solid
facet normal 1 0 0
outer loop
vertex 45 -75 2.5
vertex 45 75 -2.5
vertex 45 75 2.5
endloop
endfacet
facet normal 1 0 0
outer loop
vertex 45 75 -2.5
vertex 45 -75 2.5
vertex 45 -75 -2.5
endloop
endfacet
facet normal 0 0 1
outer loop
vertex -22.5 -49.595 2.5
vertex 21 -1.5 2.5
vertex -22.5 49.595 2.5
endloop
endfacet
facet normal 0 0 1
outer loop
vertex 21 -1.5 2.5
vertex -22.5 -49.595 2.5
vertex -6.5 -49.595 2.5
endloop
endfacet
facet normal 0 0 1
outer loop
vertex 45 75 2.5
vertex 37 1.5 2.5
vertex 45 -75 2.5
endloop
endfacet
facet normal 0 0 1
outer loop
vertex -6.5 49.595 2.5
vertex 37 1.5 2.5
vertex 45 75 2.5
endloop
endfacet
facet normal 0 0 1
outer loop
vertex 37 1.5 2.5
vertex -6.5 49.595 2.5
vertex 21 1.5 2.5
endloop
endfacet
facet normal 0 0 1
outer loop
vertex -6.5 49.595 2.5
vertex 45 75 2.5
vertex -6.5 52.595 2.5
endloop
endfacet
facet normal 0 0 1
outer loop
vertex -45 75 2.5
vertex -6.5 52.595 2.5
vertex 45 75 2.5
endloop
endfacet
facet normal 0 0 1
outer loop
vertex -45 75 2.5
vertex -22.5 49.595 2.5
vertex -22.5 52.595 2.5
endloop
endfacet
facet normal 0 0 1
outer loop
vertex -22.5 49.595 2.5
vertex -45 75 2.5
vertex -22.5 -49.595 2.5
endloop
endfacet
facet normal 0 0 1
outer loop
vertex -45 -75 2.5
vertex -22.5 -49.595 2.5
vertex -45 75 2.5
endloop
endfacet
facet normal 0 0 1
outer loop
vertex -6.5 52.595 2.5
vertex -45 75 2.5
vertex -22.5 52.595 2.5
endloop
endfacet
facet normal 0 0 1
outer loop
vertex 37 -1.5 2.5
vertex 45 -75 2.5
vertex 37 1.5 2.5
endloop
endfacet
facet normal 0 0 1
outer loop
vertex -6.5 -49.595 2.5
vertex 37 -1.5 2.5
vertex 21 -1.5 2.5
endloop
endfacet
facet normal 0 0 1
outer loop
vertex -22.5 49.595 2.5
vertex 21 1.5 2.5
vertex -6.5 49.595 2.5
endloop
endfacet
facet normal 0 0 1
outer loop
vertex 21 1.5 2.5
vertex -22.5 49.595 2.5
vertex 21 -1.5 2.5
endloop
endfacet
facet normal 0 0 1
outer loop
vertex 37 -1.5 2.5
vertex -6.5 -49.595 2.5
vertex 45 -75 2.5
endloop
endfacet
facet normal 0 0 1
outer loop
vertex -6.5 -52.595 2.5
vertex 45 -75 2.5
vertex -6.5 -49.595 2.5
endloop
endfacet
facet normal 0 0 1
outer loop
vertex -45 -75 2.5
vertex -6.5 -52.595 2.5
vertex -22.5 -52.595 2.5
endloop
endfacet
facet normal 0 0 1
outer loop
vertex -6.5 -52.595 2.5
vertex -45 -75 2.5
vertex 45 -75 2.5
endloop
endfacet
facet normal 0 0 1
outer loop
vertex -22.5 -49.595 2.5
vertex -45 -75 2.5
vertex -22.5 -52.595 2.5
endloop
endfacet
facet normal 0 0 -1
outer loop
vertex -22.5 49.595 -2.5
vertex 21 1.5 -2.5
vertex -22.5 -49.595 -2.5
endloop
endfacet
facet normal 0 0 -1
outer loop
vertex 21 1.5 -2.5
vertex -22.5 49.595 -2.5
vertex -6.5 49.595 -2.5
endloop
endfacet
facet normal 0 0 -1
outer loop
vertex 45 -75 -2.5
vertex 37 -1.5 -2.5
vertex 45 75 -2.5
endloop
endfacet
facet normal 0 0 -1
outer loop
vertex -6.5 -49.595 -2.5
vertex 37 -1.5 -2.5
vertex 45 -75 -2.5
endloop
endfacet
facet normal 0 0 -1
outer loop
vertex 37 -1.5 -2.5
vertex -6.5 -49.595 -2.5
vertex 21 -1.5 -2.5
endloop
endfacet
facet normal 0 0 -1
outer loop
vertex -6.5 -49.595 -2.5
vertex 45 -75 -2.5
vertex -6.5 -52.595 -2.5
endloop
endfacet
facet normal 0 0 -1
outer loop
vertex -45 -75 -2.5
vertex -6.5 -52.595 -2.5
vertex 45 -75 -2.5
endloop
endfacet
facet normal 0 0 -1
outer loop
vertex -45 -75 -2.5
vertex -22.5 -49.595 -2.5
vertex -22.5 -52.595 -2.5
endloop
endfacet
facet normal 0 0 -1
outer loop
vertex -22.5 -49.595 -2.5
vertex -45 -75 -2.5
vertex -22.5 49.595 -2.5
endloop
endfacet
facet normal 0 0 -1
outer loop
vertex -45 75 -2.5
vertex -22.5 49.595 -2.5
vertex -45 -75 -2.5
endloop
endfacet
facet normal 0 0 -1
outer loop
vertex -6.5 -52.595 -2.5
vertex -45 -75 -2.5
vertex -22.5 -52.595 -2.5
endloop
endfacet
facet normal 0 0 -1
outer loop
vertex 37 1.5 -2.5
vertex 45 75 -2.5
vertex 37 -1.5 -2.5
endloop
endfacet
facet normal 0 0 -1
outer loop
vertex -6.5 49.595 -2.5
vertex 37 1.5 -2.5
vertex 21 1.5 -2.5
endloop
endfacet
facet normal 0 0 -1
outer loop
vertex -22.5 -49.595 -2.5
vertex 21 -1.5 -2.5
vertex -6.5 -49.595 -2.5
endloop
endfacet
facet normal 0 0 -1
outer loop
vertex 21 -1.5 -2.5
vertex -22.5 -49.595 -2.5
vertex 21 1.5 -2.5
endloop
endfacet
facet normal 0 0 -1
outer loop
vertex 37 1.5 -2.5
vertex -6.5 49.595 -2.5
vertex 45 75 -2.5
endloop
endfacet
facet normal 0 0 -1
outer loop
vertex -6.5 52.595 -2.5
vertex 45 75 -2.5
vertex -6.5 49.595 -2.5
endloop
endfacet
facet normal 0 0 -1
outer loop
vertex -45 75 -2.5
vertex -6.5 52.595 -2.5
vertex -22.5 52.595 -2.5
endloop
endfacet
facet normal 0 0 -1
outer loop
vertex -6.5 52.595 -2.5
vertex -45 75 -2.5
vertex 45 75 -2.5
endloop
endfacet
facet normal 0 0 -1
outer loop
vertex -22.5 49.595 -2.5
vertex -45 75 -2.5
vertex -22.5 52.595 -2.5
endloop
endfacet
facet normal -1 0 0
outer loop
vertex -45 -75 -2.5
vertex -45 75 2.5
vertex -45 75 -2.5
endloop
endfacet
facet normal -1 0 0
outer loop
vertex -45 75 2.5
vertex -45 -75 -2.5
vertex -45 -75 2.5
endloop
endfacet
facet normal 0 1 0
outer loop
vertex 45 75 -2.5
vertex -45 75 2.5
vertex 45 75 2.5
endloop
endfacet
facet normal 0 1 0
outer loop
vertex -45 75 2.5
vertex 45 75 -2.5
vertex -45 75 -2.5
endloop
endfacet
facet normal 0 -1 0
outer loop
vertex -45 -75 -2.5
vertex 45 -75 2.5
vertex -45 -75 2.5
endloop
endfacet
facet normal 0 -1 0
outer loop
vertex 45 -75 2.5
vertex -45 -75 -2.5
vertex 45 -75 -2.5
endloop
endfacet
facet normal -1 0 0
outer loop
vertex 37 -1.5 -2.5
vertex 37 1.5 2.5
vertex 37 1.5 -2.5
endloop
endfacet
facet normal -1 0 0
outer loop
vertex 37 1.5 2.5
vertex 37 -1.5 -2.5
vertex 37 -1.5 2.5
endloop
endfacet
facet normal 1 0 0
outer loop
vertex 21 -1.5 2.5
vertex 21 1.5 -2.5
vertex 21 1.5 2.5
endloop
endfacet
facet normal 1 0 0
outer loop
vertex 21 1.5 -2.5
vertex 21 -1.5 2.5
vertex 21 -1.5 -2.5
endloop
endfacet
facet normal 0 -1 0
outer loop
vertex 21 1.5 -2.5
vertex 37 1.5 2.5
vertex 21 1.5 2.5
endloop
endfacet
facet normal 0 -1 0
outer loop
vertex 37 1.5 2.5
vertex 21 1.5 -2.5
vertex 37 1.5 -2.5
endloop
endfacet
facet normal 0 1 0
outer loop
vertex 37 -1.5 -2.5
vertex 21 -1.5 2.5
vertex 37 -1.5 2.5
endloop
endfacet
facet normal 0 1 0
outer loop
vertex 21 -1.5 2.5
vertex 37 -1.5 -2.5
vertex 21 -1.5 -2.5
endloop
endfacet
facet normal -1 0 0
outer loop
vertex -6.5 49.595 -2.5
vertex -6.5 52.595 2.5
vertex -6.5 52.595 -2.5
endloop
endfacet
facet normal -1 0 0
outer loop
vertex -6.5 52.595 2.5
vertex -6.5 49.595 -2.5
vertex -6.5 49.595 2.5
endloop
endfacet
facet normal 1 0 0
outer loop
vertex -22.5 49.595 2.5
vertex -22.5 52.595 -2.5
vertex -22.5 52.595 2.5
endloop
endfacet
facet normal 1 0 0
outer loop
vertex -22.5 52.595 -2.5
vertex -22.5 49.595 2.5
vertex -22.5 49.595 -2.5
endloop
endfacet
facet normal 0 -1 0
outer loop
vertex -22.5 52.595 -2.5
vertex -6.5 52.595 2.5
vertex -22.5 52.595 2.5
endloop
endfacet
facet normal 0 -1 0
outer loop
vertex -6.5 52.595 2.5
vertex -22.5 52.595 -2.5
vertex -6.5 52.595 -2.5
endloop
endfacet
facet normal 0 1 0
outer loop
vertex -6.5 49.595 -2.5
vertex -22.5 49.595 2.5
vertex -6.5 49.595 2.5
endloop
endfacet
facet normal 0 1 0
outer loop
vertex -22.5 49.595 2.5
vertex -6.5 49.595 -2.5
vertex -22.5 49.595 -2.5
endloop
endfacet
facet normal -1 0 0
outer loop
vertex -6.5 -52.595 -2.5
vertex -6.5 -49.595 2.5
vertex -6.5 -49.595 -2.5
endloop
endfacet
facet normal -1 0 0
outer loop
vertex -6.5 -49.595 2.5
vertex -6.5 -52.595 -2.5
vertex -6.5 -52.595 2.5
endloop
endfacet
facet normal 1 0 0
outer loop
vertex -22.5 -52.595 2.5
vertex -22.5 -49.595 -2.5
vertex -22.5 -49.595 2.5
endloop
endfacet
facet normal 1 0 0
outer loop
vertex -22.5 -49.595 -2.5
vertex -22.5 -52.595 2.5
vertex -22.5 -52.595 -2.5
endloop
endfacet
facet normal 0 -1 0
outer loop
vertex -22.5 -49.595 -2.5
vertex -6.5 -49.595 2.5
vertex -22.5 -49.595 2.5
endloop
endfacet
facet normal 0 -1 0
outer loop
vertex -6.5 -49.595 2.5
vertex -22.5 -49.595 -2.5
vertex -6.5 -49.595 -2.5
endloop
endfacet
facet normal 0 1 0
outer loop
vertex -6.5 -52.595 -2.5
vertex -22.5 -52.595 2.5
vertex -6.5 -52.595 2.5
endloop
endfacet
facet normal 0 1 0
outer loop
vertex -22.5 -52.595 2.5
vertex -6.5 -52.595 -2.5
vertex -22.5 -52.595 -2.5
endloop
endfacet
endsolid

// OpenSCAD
// ========================================
// a 9 x 15 x 0.5 cm plate with three 1.6 x 0.3 cm slots
// NeuroCAD canonical IR; dimensions are millimetres
// ========================================
$fn = 48;

difference() {
  cube(size=[90, 150, 5], center=true);
  translate([29, 0, 0]) {
    cube(size=[16, 3, 7], center=true);
  }
  translate([-14.5, 51.0954988232819, 0]) {
    cube(size=[16, 3, 7], center=true);
  }
  translate([-14.5, -51.0954988232819, 0]) {
    cube(size=[16, 3, 7], center=true);
  }
}
